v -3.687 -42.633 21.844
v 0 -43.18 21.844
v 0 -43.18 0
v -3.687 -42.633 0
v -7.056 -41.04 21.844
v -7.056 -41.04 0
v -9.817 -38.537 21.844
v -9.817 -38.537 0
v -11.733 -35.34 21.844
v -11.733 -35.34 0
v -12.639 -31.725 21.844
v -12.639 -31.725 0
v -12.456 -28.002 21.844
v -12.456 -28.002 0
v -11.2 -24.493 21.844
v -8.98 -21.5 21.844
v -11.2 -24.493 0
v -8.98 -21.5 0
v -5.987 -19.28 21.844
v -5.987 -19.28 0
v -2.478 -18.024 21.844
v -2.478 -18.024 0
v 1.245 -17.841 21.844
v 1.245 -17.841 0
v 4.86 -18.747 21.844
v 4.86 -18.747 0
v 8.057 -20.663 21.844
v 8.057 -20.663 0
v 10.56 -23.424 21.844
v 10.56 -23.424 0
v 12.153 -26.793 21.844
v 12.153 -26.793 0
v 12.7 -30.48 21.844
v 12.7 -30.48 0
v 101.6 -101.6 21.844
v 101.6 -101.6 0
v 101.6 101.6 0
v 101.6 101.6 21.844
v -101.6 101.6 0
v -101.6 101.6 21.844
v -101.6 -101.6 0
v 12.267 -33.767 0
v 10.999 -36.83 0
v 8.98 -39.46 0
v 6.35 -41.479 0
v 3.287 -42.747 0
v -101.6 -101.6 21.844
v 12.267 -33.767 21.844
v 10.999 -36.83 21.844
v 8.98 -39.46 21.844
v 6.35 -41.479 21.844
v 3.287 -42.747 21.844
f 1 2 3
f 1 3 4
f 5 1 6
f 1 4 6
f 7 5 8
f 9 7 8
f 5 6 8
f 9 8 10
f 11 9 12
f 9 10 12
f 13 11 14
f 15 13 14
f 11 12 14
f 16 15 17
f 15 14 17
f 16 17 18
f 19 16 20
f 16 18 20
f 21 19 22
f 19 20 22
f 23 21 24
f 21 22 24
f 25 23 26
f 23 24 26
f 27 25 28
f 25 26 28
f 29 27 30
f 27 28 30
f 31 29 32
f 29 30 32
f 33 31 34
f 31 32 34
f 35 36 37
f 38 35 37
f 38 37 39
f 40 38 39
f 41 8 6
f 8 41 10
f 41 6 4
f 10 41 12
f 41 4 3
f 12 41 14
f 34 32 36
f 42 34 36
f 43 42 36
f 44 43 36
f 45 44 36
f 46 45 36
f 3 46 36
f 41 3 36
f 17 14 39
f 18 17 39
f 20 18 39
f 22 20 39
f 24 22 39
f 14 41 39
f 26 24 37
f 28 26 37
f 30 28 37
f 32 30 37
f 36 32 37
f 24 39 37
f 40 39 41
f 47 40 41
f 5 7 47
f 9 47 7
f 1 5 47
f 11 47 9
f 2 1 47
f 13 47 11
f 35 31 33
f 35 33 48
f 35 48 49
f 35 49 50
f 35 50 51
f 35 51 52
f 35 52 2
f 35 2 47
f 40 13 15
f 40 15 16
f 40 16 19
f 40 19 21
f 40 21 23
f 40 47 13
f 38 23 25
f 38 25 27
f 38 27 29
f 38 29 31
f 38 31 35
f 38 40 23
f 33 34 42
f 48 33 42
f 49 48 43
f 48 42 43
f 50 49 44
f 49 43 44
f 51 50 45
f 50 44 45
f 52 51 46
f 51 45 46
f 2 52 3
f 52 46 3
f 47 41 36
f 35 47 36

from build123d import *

# Parameters (mm, degrees)
F1_DEPTH = 21.844


with BuildPart() as f1:
    # F0 (on Top) → F1 (new body)
    with BuildSketch(Plane.XY):
        with BuildLine():
            ThreePointArc((12.7, -30.48), (-8.980256, -21.499744), (0, -43.18))
            ThreePointArc((0, -43.18), (8.980256, -39.460256), (12.7, -30.48))
        make_face()
        Polygon((0, -101.6), (101.6, -101.6), (101.6, 101.6), (-101.6, 101.6), (-101.6, -101.6), align=None)
        with BuildLine():
            ThreePointArc((12.7, -30.48), (8.980256, -39.460256), (0, -43.18))
            ThreePointArc((0, -43.18), (-8.980256, -21.499744), (12.7, -30.48))
        make_face(mode=Mode.SUBTRACT)
    extrude(amount=F1_DEPTH)


solid = f1.part
